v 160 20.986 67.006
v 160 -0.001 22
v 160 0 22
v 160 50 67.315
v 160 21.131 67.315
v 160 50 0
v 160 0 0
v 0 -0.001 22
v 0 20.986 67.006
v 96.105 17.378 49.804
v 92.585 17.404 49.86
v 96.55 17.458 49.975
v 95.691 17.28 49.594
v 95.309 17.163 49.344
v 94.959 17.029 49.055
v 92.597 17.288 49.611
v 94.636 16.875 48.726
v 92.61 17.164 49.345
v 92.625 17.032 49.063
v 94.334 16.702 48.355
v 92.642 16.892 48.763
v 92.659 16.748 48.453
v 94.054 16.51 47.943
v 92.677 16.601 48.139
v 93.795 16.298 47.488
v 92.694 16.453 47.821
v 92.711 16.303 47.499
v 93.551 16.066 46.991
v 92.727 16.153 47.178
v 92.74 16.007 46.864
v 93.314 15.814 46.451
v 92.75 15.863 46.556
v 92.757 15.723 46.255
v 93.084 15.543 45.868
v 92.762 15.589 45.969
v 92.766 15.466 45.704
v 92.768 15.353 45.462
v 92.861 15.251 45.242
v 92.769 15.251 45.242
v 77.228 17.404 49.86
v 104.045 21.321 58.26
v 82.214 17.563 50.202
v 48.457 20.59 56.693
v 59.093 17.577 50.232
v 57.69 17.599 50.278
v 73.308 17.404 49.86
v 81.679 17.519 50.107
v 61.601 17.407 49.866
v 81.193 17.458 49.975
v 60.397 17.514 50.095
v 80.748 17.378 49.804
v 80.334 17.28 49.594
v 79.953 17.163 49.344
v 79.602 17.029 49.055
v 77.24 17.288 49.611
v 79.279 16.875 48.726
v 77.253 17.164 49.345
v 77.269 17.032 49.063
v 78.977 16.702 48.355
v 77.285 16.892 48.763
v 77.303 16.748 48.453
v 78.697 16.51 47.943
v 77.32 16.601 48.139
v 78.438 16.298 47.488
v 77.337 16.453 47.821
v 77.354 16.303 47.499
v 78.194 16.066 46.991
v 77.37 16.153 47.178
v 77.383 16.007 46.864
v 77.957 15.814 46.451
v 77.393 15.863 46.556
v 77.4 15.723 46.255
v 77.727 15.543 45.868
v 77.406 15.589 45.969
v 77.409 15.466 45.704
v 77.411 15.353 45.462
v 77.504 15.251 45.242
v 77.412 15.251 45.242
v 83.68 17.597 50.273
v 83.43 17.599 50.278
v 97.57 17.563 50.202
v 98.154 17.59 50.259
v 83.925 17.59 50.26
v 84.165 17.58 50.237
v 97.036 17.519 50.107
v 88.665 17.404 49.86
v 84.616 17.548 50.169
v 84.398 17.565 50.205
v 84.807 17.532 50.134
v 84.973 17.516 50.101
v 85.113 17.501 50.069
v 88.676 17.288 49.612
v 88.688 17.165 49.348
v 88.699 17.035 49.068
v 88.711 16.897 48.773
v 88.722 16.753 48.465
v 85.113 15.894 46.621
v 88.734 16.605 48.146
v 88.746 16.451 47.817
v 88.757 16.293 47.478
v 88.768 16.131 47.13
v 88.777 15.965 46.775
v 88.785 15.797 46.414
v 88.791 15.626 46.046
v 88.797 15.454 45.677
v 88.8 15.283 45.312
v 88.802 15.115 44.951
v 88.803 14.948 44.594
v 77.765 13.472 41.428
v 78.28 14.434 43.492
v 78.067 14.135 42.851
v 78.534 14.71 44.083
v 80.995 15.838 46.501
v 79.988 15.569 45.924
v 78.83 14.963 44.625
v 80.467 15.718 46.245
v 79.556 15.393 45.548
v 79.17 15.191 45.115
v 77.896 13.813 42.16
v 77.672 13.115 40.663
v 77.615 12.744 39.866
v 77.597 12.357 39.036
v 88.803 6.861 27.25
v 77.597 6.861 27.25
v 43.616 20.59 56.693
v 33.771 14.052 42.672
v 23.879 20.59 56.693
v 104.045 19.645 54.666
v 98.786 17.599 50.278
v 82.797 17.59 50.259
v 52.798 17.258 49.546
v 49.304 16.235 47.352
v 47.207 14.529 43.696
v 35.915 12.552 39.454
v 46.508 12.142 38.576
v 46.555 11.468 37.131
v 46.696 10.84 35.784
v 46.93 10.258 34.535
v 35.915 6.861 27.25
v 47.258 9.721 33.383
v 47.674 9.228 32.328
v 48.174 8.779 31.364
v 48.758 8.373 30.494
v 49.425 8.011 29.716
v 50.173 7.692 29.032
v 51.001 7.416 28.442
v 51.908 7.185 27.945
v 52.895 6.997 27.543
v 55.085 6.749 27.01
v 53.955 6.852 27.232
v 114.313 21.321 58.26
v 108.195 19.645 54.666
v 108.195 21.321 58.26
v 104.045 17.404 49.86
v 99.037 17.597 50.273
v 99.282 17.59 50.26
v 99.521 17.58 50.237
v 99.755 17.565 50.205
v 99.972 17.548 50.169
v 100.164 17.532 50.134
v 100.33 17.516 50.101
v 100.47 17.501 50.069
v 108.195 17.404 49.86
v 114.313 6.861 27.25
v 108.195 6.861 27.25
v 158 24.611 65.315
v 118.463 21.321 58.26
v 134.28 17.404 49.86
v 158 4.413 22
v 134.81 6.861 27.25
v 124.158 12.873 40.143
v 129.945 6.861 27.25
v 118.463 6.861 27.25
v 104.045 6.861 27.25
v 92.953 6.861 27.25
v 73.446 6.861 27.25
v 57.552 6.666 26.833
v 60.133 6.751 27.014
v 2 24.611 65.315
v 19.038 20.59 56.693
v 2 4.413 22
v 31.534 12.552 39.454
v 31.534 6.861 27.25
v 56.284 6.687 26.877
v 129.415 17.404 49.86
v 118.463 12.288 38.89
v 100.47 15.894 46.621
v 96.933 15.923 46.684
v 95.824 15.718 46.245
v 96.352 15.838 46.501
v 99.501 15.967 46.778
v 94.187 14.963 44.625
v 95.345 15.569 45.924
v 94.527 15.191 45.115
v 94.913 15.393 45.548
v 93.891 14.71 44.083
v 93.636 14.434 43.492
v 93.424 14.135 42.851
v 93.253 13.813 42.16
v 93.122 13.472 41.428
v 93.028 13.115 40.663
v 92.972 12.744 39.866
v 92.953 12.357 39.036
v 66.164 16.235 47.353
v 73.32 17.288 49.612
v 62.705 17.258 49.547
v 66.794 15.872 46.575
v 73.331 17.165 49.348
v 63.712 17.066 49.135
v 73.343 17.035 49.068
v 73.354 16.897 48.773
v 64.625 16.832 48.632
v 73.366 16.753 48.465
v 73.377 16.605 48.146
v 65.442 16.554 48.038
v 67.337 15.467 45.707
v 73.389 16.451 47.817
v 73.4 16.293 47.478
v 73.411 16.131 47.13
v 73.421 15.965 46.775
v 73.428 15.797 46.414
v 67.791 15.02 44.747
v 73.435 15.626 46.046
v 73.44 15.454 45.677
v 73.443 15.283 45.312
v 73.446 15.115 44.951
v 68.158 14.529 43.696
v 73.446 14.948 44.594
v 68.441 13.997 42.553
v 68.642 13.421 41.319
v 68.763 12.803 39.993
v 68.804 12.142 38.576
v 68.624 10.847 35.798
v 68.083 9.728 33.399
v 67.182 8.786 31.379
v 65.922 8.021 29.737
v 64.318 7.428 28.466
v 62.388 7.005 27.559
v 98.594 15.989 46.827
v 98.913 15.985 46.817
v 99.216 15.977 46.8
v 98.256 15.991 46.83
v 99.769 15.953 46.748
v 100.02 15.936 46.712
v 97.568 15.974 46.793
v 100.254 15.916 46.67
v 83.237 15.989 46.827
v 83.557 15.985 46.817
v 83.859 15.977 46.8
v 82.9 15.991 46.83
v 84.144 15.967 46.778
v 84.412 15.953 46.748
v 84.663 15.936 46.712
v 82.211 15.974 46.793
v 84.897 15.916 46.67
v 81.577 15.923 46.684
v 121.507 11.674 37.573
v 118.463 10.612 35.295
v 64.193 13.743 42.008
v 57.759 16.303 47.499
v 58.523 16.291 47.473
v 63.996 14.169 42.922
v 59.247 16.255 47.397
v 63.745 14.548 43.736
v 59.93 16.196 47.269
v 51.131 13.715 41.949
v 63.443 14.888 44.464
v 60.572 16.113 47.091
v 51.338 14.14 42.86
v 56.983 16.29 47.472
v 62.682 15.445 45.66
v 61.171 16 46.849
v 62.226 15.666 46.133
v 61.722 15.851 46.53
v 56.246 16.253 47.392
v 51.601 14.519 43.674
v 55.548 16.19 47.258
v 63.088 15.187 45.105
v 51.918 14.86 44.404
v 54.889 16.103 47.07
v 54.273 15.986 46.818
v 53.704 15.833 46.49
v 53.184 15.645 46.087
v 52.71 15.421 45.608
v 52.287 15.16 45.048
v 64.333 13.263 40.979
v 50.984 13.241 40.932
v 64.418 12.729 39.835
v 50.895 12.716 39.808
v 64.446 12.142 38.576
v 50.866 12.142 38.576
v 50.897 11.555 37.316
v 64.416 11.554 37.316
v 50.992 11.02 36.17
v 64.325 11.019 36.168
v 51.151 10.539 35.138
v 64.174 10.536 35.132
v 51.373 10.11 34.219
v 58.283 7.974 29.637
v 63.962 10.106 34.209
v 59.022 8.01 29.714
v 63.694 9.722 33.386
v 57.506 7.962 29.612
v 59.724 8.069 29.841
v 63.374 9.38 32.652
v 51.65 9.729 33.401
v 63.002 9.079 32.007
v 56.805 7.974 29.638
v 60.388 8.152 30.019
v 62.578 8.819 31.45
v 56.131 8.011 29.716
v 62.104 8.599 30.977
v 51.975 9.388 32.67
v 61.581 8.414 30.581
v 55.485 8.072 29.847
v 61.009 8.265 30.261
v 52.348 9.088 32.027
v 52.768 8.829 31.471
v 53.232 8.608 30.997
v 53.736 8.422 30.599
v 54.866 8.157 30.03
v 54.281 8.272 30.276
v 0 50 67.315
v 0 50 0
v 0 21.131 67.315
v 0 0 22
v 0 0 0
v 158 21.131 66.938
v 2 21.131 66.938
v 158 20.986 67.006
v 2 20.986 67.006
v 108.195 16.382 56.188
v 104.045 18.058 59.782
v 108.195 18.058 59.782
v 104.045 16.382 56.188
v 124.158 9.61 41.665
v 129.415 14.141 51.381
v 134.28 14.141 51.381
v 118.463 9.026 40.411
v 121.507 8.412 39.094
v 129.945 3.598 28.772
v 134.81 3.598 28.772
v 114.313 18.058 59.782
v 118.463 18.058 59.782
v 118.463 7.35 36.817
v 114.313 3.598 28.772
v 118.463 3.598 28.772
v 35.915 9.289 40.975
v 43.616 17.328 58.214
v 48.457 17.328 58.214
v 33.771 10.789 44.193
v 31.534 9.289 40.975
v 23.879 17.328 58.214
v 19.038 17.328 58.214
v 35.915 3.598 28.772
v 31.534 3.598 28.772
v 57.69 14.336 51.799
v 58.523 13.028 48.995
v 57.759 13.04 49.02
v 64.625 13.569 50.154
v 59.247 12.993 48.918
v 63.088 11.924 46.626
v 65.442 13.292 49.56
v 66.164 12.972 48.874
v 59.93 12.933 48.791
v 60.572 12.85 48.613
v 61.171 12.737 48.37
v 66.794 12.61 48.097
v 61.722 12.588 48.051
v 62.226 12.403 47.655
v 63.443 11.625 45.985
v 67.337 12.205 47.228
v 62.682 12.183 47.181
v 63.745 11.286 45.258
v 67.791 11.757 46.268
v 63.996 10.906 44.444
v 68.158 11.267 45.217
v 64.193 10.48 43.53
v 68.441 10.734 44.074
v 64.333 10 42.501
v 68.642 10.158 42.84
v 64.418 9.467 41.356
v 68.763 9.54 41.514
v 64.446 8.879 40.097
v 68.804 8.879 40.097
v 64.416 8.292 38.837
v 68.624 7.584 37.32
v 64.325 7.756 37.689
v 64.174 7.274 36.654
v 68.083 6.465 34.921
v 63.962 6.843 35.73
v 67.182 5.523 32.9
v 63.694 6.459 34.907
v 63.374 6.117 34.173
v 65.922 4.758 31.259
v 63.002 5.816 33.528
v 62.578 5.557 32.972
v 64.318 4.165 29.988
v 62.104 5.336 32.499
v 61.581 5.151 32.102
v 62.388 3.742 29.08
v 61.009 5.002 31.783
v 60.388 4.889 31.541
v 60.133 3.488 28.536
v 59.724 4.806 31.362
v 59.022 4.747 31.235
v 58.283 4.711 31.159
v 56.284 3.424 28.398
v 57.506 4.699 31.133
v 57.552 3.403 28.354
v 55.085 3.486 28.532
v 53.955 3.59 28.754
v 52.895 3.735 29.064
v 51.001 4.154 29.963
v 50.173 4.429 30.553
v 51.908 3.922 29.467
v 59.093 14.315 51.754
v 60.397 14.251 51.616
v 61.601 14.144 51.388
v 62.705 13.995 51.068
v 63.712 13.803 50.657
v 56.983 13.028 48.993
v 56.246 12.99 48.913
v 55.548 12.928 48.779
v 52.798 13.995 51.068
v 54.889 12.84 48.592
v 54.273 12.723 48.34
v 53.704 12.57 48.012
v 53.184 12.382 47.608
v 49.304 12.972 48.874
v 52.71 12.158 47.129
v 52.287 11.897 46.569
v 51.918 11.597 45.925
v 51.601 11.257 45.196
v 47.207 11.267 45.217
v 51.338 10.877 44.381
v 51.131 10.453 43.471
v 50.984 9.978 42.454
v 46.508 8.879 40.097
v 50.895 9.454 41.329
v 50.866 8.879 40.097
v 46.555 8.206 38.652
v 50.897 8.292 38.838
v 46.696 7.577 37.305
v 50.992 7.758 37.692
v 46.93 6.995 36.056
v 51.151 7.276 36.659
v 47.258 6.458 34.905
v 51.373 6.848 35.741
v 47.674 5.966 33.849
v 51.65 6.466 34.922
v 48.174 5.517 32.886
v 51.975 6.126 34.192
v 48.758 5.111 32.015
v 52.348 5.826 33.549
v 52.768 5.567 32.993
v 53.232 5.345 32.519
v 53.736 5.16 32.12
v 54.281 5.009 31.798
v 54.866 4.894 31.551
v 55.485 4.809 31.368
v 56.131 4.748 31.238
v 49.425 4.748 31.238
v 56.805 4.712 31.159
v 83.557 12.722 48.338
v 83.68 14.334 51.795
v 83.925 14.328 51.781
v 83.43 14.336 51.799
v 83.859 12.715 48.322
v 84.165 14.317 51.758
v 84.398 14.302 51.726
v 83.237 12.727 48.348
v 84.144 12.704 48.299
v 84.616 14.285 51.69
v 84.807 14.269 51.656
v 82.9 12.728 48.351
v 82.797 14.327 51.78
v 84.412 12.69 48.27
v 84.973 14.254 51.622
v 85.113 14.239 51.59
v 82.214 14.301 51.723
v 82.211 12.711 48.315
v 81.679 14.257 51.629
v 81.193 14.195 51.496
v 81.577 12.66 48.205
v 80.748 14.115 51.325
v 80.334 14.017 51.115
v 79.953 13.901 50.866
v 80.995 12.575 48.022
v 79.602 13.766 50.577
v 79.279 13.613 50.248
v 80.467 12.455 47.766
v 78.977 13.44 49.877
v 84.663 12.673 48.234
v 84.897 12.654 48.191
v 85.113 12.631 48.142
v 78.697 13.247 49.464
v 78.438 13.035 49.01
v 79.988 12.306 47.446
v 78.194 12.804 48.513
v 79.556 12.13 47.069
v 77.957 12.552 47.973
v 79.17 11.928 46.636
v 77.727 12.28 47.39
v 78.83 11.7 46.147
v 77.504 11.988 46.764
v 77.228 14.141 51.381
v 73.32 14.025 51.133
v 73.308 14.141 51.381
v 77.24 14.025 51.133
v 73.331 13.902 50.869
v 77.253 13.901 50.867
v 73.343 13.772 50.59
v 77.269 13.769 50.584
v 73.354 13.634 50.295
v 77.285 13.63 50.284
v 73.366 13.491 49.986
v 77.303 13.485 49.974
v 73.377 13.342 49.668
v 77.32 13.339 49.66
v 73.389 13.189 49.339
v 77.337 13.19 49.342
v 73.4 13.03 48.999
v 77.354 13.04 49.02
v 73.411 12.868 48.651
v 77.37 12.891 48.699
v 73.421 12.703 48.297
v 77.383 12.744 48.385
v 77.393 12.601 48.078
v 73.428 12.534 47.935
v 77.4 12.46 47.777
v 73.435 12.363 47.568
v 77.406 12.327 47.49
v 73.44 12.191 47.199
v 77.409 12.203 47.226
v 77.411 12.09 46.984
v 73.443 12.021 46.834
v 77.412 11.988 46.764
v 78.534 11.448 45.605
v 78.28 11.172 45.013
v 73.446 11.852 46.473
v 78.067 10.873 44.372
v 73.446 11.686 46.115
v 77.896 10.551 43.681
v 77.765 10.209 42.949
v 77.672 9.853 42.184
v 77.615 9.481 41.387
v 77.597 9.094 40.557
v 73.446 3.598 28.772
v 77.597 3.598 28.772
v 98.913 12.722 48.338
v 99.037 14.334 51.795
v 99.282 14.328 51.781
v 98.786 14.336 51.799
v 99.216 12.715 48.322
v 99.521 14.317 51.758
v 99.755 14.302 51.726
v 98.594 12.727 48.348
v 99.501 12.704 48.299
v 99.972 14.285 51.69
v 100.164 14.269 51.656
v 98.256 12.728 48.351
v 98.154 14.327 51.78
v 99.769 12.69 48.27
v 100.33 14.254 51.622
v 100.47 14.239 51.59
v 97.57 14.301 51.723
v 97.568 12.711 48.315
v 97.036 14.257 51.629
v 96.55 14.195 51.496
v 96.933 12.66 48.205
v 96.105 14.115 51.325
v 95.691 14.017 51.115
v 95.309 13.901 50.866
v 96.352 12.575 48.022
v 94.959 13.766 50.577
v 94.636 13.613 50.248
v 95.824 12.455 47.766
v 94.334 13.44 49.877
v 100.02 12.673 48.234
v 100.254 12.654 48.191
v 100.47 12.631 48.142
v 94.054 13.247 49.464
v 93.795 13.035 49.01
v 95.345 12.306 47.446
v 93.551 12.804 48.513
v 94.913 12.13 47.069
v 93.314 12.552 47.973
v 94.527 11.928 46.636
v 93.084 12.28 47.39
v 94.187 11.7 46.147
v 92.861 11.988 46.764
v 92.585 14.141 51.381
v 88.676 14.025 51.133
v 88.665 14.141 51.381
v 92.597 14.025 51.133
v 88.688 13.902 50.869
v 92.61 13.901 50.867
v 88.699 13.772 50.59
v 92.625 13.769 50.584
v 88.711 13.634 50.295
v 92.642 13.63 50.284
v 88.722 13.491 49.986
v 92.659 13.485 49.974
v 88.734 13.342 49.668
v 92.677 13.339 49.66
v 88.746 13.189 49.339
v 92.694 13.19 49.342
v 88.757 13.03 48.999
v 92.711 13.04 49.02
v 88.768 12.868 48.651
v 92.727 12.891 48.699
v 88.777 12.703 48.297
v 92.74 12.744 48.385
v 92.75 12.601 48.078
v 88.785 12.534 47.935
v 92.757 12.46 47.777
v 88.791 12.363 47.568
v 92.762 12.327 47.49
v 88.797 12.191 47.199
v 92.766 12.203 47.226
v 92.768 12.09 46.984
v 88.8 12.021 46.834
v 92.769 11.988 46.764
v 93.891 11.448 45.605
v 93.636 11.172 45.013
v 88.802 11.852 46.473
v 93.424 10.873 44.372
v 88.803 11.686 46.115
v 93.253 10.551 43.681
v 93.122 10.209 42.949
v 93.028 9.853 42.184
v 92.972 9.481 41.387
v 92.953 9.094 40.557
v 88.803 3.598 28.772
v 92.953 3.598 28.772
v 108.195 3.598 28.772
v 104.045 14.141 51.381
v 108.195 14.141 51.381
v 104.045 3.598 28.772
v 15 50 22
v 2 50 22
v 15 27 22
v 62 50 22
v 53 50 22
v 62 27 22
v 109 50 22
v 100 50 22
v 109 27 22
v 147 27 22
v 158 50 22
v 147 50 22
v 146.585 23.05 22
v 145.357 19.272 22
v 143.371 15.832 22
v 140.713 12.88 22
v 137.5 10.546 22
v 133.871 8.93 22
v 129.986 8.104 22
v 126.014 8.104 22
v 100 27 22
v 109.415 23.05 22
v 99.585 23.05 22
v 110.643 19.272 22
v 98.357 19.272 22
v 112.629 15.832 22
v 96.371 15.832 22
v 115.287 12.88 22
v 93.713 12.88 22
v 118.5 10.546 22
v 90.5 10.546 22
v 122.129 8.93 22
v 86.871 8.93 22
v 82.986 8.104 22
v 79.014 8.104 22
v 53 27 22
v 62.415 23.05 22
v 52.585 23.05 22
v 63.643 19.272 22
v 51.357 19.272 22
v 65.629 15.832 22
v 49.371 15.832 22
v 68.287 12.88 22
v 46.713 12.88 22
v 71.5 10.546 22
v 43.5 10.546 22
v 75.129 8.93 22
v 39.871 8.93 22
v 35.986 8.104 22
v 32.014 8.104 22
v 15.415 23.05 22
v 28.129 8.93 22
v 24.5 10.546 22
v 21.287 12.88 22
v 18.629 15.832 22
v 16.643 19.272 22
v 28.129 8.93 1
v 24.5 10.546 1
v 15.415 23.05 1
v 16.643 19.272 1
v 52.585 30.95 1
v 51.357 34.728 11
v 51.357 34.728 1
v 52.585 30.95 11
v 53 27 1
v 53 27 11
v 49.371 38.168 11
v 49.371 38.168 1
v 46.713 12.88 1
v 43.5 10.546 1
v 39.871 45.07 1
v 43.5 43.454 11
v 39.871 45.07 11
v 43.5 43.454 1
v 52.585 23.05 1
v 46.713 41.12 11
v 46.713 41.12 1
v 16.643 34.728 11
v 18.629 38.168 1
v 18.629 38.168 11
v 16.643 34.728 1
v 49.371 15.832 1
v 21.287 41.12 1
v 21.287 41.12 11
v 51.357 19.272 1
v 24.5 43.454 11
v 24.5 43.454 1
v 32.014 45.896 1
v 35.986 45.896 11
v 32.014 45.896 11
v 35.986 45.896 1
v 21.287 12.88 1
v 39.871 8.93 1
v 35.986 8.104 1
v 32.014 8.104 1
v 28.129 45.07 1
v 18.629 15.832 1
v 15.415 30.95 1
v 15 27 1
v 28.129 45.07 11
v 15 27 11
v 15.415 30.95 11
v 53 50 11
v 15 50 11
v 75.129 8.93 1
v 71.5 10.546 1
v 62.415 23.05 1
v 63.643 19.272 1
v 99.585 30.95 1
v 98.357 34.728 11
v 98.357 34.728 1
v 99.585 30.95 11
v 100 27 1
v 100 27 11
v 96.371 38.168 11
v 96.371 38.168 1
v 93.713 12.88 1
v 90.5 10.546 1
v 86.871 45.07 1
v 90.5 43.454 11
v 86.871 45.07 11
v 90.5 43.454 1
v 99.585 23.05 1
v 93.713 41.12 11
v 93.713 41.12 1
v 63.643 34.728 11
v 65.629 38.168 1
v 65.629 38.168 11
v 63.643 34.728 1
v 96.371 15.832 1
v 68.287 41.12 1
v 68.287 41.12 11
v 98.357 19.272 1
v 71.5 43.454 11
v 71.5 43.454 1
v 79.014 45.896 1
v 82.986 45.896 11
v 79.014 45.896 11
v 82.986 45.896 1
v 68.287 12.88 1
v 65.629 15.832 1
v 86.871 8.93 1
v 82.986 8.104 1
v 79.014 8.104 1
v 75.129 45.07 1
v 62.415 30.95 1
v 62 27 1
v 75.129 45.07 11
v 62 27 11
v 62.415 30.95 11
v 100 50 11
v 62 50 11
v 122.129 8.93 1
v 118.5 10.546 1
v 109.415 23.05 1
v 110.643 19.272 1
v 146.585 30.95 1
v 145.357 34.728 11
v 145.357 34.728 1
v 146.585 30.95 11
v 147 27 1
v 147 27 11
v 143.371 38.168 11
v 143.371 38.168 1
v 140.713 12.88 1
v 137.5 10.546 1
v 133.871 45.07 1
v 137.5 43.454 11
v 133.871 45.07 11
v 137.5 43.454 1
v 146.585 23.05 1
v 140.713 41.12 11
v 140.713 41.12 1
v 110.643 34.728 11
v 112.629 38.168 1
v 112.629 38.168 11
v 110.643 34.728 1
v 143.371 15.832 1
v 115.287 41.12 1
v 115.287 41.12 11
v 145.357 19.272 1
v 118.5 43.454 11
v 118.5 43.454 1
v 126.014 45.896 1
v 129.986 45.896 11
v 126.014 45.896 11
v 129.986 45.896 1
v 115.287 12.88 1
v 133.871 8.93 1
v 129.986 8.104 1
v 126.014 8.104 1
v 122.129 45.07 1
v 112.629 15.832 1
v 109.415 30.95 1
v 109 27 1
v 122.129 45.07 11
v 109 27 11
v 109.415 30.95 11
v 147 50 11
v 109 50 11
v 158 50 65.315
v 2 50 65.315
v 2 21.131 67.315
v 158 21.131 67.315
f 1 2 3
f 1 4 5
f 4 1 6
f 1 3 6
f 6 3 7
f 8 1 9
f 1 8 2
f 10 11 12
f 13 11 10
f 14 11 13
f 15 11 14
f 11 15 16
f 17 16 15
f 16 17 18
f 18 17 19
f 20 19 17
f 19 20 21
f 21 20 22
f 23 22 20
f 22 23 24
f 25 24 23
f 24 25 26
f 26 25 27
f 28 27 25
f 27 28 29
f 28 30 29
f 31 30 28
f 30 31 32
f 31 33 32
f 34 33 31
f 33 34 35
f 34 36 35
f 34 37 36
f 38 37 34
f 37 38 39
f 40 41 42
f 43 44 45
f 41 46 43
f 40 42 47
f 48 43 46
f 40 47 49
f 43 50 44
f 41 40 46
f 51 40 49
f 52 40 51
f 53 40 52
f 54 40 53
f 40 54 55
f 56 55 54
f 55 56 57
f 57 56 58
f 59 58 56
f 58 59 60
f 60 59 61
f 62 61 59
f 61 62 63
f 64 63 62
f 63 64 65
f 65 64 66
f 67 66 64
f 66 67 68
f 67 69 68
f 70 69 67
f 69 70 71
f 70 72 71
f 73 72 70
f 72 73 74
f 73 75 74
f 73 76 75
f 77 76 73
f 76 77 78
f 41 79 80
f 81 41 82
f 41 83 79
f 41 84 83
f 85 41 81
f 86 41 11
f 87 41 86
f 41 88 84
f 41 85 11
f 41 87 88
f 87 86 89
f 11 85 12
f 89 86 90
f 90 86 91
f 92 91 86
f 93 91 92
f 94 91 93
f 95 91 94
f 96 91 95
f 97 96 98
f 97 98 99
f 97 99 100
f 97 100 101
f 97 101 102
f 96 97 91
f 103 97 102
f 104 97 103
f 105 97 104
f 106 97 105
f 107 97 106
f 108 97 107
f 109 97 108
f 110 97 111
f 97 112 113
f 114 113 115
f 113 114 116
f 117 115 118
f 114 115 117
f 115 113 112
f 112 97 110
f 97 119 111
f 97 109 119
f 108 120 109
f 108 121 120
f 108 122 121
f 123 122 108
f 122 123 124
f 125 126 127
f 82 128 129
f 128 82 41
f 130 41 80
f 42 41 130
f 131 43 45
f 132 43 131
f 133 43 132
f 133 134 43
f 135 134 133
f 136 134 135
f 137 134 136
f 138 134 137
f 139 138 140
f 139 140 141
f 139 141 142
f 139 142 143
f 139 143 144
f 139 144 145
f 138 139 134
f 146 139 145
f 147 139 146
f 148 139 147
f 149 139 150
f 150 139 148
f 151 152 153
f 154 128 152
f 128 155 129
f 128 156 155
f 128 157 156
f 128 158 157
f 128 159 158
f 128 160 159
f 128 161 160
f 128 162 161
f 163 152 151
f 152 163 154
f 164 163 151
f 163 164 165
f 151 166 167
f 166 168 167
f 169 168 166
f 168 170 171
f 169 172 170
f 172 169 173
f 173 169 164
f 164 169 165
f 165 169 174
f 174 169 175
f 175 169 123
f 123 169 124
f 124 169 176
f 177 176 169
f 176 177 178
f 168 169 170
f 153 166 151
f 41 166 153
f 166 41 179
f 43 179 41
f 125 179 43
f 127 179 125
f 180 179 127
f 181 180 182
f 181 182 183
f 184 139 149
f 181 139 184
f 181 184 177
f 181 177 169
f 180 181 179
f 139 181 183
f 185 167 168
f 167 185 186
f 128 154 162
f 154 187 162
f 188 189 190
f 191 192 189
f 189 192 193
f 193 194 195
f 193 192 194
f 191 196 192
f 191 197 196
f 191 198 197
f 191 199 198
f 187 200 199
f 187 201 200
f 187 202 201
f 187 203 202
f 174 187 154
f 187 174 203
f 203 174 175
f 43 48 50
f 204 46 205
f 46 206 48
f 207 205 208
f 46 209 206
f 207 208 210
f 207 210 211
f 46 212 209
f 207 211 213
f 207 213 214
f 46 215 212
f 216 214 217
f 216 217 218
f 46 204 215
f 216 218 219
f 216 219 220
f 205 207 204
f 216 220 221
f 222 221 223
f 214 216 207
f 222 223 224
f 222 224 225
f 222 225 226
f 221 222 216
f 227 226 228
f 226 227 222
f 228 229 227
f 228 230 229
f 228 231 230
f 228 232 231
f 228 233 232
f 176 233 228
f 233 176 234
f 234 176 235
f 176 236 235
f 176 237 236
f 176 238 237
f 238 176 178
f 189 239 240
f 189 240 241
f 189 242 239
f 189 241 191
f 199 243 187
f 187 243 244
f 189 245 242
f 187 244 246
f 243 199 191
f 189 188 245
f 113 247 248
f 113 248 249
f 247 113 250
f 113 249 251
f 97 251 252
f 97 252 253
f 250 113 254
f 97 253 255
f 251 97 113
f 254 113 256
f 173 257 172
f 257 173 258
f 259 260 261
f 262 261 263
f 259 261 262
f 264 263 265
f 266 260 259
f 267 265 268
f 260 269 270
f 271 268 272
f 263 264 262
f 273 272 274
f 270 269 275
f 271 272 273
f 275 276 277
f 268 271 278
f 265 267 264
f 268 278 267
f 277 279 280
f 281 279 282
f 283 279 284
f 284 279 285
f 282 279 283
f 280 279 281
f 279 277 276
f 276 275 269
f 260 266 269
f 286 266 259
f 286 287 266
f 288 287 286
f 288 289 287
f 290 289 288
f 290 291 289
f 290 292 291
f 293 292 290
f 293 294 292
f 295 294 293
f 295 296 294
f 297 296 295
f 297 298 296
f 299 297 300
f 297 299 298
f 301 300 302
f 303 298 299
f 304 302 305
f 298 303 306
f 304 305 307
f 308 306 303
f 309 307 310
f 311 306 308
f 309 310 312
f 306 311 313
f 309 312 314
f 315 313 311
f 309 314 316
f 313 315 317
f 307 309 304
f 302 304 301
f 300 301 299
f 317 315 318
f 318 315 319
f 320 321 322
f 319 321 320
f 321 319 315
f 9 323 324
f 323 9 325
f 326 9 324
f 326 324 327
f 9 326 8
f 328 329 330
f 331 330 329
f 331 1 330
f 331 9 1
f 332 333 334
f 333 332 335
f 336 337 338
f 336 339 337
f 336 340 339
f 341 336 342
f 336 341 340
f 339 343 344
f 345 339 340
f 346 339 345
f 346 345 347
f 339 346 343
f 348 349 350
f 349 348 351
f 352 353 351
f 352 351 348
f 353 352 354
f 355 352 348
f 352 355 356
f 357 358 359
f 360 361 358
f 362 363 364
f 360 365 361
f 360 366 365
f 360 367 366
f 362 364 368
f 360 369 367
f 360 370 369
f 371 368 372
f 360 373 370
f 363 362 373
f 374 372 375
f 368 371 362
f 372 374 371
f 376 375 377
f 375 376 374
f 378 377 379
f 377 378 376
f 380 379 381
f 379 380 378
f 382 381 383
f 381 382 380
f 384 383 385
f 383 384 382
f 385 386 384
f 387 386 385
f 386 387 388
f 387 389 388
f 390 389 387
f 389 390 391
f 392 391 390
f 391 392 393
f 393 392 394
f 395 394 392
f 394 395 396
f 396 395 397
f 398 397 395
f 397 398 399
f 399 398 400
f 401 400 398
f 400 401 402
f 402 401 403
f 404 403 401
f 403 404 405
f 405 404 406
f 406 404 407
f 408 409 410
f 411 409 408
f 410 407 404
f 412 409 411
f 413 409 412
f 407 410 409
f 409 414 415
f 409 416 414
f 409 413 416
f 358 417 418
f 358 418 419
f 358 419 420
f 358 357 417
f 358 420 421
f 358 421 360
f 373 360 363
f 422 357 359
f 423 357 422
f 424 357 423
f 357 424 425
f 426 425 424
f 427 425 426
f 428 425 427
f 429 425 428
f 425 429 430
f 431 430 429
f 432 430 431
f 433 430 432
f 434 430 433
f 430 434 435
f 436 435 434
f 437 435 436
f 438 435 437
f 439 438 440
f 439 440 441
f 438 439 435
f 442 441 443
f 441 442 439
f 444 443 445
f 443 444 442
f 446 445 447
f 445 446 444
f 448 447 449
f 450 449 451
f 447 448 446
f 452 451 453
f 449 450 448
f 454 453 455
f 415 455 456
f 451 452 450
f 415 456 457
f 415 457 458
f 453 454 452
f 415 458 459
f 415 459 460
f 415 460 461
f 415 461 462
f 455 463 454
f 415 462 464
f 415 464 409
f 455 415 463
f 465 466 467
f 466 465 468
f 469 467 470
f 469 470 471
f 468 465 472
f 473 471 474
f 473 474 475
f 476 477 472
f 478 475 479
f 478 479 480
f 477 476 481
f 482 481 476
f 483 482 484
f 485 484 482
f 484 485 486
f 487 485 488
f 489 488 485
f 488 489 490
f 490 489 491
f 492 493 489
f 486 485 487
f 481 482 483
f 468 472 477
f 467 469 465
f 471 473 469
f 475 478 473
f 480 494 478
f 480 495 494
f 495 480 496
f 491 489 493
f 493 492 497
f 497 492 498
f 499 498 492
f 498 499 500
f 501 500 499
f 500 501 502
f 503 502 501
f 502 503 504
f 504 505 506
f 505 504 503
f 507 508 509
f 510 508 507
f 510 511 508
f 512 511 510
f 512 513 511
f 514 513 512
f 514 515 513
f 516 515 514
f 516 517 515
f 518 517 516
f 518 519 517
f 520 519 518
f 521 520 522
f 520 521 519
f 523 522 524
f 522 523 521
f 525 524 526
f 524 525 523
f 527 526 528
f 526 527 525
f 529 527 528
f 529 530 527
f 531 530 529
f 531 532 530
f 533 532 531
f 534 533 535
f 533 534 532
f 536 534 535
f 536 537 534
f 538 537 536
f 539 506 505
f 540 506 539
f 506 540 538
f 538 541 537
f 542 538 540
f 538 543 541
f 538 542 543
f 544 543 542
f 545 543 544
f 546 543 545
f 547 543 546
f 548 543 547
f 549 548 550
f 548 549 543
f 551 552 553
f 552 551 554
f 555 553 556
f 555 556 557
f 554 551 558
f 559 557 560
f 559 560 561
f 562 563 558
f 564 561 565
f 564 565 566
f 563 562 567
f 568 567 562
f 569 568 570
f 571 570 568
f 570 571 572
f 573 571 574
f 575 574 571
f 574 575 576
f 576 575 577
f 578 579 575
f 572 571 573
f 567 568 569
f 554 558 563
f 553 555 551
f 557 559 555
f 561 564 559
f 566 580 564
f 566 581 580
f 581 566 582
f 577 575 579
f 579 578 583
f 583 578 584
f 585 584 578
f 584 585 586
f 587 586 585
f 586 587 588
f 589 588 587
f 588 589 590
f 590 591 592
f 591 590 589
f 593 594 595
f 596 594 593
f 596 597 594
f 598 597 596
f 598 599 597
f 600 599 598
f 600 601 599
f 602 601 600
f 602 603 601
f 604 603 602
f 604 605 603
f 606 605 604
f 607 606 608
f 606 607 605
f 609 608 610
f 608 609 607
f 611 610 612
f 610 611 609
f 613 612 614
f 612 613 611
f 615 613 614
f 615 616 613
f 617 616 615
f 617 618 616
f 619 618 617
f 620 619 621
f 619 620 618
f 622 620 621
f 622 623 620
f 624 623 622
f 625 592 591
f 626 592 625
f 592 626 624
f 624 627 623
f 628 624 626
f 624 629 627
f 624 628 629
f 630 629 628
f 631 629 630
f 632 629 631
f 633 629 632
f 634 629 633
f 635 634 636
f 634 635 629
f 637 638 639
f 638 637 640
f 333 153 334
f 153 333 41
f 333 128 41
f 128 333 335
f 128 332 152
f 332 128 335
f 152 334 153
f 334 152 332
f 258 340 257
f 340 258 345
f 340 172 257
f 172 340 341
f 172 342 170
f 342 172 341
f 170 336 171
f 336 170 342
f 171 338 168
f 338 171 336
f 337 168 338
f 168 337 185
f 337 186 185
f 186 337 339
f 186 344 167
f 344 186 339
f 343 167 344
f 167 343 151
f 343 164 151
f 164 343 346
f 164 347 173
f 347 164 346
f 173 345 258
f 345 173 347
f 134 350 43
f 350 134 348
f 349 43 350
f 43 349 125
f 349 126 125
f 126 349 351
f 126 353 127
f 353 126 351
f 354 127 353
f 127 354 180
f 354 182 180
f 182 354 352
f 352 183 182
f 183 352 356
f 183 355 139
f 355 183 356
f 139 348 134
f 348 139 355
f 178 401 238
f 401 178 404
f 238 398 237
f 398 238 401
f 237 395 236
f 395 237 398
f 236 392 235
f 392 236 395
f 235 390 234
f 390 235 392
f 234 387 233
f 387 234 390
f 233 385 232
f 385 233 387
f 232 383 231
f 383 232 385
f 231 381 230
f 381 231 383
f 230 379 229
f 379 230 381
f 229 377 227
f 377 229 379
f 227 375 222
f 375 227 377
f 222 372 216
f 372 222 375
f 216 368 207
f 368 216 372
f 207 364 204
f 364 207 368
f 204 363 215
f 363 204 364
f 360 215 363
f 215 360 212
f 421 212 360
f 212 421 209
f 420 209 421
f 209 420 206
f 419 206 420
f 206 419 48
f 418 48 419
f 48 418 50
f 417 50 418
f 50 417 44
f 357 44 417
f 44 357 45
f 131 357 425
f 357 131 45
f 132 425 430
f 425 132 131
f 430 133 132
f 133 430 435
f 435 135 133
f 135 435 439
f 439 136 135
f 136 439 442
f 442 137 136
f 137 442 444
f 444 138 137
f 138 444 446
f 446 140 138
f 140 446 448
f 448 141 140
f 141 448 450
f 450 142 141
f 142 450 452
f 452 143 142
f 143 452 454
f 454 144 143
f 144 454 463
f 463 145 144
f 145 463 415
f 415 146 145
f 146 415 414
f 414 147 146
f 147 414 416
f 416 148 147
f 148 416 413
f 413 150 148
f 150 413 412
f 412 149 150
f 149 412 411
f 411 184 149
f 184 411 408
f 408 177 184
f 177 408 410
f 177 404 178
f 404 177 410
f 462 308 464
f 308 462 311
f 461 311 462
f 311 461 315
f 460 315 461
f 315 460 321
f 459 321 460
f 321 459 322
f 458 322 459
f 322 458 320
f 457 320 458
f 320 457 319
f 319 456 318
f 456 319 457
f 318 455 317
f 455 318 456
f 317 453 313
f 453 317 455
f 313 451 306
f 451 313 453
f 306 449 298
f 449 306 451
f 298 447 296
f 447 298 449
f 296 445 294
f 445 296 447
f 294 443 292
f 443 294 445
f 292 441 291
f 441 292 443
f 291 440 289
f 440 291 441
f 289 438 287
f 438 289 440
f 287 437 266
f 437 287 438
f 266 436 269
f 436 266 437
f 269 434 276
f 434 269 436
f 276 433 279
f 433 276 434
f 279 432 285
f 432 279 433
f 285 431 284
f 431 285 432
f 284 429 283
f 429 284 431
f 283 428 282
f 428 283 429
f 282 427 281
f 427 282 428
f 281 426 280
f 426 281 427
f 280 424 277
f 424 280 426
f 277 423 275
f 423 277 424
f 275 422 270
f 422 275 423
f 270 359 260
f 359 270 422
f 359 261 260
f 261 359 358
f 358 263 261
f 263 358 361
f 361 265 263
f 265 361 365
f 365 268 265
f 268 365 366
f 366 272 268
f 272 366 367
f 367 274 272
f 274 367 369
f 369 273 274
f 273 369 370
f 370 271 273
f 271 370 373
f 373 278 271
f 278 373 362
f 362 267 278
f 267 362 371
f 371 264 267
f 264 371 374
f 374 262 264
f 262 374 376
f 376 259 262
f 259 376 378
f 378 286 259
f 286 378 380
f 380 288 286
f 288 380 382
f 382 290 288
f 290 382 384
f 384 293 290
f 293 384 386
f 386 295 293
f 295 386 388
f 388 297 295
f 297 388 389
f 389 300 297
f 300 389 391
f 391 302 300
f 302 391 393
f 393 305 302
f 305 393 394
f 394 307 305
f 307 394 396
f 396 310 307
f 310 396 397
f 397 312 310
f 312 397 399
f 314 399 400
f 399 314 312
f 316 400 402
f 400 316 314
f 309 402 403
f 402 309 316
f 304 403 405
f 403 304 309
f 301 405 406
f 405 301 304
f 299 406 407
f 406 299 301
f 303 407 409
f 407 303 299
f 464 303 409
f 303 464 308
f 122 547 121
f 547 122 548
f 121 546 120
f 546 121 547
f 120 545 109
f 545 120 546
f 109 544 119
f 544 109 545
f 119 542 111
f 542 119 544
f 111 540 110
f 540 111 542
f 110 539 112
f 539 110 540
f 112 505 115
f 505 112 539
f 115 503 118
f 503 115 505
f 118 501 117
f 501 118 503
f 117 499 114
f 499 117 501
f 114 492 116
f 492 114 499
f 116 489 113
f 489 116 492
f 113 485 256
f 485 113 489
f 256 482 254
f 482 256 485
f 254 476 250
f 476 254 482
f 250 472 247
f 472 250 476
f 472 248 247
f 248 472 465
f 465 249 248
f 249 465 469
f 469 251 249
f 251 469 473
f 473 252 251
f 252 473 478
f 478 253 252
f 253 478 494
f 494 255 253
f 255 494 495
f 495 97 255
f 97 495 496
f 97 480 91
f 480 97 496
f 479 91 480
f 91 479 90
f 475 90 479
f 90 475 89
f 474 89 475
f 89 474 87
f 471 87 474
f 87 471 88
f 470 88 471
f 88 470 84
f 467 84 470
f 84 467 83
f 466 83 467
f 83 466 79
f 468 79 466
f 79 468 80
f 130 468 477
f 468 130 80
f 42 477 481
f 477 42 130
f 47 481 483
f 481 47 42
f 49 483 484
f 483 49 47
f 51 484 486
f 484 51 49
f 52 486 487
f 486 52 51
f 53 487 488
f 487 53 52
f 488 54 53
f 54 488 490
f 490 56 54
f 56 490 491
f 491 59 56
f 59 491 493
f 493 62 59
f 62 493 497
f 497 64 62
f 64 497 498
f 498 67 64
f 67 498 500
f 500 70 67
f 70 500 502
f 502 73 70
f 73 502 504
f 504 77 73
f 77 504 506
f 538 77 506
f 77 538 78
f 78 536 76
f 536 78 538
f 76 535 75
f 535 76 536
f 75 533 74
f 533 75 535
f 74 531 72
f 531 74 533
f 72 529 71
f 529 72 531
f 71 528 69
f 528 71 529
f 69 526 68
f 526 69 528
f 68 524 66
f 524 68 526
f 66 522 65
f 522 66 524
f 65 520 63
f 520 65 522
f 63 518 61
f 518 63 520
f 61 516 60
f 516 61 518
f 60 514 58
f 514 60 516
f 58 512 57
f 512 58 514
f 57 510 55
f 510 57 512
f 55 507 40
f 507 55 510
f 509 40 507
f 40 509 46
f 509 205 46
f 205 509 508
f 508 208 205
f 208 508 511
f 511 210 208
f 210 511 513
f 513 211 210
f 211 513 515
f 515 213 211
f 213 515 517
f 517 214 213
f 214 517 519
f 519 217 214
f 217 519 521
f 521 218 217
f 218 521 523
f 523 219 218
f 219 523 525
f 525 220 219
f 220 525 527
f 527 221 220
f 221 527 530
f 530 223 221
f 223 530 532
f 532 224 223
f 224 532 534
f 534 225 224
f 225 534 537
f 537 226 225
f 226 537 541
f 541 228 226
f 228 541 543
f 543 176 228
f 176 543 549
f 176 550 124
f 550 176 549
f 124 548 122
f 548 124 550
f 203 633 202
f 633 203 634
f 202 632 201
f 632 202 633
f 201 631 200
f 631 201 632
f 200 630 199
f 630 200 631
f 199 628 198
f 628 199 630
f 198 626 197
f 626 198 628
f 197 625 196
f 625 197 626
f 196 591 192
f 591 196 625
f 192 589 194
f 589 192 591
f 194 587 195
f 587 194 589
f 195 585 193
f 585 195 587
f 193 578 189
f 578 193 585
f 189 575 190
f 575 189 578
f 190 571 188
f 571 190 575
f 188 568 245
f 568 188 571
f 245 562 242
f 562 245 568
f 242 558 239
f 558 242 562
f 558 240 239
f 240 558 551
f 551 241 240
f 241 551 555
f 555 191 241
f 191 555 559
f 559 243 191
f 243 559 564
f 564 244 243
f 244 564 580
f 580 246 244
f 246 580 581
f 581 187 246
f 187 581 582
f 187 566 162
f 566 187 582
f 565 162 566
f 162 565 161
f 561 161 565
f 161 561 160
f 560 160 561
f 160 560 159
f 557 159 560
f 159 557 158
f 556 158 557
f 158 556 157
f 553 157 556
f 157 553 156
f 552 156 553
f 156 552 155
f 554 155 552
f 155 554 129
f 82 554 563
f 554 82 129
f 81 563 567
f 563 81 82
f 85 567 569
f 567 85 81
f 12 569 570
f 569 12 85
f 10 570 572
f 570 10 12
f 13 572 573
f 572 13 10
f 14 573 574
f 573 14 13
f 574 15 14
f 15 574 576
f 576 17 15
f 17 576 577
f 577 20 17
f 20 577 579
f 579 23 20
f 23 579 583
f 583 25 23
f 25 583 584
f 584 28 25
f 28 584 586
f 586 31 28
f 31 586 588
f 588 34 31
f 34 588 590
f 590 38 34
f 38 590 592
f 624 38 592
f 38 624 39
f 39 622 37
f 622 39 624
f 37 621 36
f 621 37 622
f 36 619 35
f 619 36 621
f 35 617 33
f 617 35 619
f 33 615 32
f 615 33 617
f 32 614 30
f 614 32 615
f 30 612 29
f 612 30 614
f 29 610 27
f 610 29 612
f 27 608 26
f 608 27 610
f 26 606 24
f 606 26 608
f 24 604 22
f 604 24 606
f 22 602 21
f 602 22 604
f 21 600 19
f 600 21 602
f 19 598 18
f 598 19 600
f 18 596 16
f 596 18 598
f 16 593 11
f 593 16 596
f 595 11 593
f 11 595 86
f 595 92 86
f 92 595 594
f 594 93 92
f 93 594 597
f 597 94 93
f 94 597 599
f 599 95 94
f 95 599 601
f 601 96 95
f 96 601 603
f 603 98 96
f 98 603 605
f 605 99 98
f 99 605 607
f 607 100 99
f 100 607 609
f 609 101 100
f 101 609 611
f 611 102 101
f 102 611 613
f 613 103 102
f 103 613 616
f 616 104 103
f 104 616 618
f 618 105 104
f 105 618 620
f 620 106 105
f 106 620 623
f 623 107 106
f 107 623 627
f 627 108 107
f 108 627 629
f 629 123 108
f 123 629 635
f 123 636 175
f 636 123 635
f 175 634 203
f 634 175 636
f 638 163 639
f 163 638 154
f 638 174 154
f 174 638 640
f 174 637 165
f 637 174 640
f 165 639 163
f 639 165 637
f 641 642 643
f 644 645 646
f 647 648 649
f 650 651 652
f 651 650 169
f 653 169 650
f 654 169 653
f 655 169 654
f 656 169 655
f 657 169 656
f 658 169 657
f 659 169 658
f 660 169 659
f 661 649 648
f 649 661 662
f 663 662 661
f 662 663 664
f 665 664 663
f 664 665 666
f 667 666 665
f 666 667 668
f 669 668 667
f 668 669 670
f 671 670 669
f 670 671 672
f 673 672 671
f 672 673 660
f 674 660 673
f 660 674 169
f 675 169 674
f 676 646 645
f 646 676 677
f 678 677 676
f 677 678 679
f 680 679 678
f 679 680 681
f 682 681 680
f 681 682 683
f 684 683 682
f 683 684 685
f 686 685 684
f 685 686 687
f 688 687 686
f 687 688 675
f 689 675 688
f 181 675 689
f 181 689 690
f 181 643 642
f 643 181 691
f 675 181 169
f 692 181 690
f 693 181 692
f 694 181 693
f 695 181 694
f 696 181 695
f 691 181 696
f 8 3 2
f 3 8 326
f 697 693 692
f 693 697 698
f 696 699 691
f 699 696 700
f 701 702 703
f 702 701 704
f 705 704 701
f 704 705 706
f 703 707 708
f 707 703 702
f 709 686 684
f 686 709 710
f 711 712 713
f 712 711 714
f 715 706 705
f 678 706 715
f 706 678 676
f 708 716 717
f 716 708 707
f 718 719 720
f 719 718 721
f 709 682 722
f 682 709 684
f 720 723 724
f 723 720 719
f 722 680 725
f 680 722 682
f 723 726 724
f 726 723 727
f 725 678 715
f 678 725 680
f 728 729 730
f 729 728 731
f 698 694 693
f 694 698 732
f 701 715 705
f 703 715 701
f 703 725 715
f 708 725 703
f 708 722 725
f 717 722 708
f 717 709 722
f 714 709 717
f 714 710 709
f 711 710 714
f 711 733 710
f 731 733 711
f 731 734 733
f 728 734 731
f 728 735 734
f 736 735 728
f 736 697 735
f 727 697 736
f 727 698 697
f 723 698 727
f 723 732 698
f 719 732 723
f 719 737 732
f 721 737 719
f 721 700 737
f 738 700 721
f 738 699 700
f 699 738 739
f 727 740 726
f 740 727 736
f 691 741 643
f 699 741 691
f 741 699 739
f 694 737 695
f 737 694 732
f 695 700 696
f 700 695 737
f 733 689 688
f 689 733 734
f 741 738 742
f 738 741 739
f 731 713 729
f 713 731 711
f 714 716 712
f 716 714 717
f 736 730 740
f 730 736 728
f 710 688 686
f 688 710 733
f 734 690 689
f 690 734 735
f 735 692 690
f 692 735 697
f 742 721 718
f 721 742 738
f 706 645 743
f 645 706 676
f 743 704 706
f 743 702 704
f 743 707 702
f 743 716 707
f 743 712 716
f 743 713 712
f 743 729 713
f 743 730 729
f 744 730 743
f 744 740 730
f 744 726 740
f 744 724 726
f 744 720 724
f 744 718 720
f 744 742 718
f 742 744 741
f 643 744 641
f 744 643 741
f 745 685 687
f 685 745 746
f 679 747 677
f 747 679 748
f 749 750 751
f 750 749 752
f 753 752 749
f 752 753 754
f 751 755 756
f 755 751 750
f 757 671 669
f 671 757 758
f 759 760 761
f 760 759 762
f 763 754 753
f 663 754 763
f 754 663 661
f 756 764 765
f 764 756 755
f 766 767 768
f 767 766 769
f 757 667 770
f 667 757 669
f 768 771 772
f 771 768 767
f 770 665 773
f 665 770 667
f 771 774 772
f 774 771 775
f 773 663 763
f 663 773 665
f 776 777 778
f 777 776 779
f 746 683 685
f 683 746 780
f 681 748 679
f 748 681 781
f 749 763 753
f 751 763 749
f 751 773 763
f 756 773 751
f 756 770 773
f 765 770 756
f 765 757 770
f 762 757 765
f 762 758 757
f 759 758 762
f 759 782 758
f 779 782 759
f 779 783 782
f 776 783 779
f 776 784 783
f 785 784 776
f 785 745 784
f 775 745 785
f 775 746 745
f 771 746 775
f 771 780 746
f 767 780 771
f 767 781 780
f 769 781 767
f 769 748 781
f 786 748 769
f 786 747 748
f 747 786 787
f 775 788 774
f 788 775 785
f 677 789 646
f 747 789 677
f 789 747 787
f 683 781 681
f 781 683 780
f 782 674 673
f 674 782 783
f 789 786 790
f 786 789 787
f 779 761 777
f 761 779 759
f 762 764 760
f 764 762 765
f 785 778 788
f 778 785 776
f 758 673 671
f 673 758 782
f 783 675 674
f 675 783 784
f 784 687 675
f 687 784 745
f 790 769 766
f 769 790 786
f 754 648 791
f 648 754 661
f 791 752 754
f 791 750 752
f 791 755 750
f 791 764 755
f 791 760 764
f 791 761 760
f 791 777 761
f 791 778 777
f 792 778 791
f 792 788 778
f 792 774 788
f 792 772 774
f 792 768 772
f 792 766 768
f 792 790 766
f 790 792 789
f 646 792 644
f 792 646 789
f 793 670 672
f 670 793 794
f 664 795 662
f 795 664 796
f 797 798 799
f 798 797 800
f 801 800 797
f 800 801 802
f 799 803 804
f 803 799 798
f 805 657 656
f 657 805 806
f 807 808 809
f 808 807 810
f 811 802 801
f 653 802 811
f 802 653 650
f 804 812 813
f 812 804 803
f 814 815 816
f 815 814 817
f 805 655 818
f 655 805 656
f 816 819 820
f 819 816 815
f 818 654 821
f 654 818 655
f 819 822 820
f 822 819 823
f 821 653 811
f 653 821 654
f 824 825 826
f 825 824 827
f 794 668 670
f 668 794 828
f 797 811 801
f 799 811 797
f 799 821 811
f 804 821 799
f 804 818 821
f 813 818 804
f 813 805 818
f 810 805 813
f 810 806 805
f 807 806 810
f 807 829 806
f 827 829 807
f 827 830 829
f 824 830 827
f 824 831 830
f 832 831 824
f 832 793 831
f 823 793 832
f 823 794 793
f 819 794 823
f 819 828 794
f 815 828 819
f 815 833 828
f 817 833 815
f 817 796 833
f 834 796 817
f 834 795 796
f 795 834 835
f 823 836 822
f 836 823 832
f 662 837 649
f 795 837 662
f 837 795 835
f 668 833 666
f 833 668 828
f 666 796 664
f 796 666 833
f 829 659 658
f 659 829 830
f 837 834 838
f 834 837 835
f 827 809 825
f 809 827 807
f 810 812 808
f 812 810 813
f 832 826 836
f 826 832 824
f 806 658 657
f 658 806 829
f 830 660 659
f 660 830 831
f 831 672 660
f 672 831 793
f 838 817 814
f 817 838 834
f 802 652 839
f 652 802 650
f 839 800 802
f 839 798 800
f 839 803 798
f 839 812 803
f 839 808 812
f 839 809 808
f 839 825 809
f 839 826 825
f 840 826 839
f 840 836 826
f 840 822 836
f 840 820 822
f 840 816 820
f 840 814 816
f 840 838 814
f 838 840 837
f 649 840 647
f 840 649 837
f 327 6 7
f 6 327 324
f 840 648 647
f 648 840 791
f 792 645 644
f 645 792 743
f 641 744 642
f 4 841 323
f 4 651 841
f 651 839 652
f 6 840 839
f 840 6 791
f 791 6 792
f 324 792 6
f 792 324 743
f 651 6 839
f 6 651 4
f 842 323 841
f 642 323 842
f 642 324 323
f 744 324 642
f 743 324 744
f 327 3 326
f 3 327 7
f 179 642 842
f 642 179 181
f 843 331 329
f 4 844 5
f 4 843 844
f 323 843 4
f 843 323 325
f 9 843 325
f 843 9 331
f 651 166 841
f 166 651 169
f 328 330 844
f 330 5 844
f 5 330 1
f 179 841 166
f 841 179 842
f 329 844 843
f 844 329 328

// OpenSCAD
which=0;
DEBUG=0;


numberHeight=34;
height=4;
borderY=8;
signHeight=numberHeight+(2*borderY);
angle=65;
heightBase=22;
diameterCandle=38;
signWidthAddition=12;


if ( ! DEBUG ){
    translate([0,0*(signHeight+5),0]) NameSign(displayText="Yorrik");
    if ( which == 1) translate([0,1*(signHeight+5),0]) NameSign(displayText="Niala");
    if ( which == 2) translate([0,2*(signHeight+5),0]) NameSign(displayText="Mimir");
}
    
if ( DEBUG ){

        difference(){
            NameSign(displayText="Yorrik");
            translate([-10,-10,0]) cube([100,100,100]);
        }
}

module NameSign(displayText="Yorrik"){
    signWidthAddition=12;
    signWidth=len(displayText)*numberHeight*2/3+(2*signWidthAddition);
        
    translate([0,0,heightBase])
            FrontPlate(displayText=displayText,signWidth=signWidth,signWidthAddition=signWidthAddition);

    BasePlate(signWidth=signWidth,signWidthAddition=signWidthAddition,height=heightBase);

   for(x=[2,signWidth]){
        translate([x,0,heightBase])
            SidePlate();
    }
    
    translate([0,0,heightBase+signHeight*cos(90-angle)])
        TopPlate();
}

module TopPlate(height=height,displayText="Yorrik"){
    signWidth=len(displayText)*numberHeight*2/3+(2*signWidthAddition);
   
    thickness=2;
    translate([0,signHeight*sin(90-angle),-thickness])
        cube([signWidth,signHeight*(1-sin(90-angle)),thickness]);
}

module SidePlate(height=height){
    thickness=2;
    translate([-thickness,0,0])
    difference(){
        cube([thickness,50,signHeight*cos(90-angle)]);
    translate([-1,0,0])
        rotate([angle,0,0])
                cube([22,62,50]);
//                cube([signWidth,signHeight,height]);

    }
}
  
module BasePlate(height=height){
    difference(){
        cube([signWidth,signHeight,height]);
//        rotate([65,0,0])            cube([signWidth,signHeight,height]);

        // Holes for candles
        for(x=[15+diameterCandle/2:diameterCandle+9:signWidth-diameterCandle/2]){
            translate([x,8+diameterCandle/2,1]){
                cylinder(h=height,d=diameterCandle);
               translate([-diameterCandle/2,0,10])    
                    cube([diameterCandle,diameterCandle,height]);
            }
        }
    }
}

module FrontPlate(displayText="Demo"){
translate([0,height-.52,-2])
    difference(){
        rotate([angle,0,0])
            difference(){
                cube([signWidth,signHeight,height]);

                translate([signWidthAddition+6,borderY,-.4]) 
                    linear_extrude(height = height) {
                        text(displayText, ,size=numberHeight,halign="left");
                    }
                }
        translate([-1,-height,0])     cube([signWidth+2,height*2,height/2]);
        }
// #    translate([0,.4-height,0])     cube([signWidth,height,height/2]);
       
}
